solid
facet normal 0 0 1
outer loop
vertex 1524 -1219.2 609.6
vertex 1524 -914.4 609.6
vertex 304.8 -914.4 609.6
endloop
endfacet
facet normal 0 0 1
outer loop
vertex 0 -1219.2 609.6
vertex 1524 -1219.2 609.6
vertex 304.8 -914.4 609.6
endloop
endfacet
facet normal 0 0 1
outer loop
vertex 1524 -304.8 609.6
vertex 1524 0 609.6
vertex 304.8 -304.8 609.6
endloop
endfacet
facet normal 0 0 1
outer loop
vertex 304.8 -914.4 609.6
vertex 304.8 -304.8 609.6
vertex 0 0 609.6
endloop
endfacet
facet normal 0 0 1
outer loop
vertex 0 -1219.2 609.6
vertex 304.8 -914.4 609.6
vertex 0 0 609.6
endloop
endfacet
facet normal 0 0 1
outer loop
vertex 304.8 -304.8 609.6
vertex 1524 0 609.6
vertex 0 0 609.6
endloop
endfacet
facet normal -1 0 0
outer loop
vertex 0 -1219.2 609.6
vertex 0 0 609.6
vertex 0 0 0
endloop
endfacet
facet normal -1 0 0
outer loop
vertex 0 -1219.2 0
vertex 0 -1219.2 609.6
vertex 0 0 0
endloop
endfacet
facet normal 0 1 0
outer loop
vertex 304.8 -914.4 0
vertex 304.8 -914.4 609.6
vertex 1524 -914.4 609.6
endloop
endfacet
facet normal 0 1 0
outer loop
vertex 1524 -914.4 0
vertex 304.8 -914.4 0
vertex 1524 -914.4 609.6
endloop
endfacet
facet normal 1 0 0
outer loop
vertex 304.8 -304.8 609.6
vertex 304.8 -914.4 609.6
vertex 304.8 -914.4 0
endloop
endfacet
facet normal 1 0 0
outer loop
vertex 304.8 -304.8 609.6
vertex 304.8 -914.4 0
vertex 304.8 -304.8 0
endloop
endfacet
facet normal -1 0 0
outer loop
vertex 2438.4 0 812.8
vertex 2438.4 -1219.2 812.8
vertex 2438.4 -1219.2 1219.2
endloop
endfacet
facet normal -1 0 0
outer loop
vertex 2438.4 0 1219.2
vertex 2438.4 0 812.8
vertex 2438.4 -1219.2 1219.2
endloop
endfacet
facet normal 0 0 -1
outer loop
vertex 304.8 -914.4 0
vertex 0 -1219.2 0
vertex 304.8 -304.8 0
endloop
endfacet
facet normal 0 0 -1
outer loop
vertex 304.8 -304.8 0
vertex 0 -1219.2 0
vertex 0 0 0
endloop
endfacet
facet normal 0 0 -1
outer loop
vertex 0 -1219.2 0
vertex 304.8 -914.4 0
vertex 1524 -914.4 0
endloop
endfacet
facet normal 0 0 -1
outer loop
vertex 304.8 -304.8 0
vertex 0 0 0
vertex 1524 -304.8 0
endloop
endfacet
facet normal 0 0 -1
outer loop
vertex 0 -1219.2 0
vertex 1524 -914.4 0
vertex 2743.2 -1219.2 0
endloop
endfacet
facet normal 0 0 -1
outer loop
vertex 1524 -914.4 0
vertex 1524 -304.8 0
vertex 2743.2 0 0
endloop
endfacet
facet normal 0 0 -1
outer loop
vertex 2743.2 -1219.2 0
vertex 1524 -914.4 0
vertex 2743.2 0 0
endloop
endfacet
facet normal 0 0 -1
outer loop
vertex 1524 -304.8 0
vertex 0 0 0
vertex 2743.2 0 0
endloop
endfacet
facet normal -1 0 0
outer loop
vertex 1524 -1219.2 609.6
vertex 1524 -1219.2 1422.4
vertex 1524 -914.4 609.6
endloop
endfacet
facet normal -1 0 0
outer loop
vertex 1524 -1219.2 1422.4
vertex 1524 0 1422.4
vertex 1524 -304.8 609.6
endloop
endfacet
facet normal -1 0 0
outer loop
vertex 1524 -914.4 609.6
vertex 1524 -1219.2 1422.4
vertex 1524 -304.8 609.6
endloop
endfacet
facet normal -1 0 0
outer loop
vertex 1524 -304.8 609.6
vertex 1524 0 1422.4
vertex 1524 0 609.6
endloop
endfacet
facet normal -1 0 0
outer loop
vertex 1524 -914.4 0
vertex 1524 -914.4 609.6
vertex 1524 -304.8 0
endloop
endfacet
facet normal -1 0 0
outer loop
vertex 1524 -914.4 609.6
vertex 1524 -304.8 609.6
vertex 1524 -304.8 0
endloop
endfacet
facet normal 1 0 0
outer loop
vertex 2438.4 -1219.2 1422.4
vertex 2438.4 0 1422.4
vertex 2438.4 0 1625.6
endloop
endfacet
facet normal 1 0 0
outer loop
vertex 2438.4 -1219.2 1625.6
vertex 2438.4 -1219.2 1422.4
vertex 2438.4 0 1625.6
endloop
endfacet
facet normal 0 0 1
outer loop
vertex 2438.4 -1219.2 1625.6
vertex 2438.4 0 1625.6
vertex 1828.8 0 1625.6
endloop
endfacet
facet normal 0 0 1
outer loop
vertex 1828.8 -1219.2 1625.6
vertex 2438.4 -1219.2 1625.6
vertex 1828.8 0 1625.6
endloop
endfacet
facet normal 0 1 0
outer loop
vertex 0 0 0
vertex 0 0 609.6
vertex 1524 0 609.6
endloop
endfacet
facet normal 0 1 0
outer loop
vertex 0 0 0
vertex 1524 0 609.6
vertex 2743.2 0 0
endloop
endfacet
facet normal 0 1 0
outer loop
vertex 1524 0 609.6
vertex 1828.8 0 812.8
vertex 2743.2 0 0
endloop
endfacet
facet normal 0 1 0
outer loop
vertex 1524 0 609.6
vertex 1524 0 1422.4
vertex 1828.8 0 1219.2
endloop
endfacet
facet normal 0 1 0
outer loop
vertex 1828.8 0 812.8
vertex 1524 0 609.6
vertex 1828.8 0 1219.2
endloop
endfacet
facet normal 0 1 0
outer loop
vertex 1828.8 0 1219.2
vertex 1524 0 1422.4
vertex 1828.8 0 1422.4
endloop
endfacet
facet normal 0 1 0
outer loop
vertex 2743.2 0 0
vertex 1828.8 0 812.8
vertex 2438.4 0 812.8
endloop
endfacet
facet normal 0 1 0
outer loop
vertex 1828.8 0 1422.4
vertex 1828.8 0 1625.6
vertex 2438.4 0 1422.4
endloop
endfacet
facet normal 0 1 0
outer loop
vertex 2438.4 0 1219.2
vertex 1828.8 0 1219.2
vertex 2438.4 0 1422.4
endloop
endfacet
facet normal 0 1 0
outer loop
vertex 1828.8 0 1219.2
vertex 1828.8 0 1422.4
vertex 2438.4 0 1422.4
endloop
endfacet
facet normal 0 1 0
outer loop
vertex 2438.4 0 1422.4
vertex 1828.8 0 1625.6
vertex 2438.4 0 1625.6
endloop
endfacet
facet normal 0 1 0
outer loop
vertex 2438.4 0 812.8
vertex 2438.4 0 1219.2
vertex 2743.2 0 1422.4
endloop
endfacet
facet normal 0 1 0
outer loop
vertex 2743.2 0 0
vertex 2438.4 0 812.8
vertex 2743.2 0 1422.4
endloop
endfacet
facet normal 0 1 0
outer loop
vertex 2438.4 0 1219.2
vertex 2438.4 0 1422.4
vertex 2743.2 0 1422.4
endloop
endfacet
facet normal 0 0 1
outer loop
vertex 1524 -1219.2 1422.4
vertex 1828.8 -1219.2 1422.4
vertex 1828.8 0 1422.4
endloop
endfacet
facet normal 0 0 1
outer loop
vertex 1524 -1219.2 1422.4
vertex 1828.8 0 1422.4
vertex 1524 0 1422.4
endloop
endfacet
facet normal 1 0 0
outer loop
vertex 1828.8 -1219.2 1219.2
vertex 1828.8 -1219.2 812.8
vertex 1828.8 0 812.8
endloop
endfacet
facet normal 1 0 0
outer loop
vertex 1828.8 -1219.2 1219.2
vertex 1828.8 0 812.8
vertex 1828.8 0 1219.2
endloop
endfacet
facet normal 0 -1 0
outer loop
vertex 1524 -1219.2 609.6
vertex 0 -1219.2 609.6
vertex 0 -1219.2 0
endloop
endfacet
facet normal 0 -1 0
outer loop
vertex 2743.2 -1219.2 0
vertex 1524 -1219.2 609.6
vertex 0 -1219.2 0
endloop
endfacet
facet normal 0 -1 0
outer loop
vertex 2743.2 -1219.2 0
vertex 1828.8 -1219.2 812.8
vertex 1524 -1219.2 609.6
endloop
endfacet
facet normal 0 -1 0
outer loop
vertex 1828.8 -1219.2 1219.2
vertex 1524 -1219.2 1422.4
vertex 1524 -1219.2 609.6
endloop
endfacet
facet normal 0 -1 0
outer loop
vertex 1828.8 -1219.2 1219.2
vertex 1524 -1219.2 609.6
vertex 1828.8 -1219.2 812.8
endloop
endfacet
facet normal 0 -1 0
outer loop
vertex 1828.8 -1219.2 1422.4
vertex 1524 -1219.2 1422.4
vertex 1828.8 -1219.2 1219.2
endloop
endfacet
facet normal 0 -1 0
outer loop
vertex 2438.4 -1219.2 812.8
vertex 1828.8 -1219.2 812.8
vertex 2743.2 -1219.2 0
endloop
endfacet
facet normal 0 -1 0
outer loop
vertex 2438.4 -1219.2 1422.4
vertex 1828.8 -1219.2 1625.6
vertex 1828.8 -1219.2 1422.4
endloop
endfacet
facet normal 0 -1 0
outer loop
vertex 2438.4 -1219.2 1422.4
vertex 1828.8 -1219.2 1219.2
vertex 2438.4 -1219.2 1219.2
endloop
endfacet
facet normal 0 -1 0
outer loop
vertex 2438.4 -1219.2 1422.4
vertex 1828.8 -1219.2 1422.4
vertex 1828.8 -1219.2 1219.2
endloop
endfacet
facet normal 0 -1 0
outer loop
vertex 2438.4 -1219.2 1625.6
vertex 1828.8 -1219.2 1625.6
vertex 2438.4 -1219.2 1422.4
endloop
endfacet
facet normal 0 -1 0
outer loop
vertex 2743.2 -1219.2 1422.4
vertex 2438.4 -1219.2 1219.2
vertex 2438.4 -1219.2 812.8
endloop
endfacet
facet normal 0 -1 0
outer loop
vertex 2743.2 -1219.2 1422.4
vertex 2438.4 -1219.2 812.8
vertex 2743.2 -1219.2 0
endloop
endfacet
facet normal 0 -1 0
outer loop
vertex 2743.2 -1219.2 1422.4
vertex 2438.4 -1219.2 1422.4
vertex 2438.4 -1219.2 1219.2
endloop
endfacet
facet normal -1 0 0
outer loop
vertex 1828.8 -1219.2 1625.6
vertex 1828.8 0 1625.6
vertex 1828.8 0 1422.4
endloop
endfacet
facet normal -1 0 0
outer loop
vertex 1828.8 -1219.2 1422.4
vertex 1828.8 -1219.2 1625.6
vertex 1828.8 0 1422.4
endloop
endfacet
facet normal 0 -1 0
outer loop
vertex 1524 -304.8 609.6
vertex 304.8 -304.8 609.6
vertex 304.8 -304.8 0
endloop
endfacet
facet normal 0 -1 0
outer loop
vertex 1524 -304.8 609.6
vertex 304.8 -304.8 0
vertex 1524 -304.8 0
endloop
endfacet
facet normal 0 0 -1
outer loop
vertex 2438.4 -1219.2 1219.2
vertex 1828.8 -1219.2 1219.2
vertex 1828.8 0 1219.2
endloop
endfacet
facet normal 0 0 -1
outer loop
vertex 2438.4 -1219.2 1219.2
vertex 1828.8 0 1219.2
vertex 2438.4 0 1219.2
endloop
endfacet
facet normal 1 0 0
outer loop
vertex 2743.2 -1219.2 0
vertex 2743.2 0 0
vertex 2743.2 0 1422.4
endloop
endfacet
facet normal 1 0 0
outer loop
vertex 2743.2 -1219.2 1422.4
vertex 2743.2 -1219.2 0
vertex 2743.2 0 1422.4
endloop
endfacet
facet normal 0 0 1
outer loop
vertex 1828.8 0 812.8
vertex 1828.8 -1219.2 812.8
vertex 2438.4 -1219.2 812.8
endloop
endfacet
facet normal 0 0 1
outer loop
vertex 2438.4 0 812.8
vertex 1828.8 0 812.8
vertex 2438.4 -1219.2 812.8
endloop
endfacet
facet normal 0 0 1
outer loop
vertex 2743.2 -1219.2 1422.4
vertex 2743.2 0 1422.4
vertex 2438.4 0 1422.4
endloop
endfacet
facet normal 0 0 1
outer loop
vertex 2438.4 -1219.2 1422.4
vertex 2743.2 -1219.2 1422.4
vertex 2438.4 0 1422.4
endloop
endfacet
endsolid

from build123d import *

# Parameters (mm, degrees)
F1_DEPTH = 1219.2
F2_W     = 609.6
F2_H     = 406.4
F3_DEPTH = 1219.2
F4_W     = 1219.2
F4_H     = 609.6
F5_DEPTH = 609.6


# Not quite as in the source:
# - a feature of the source that left no trace in its solid (it failed there, or was rolled back) is left out


with BuildPart() as f1:
    # F0 (on Front) → F1 (new body)
    with BuildSketch(Plane.XZ):
        Polygon((0, 609.6), (0, 0), (2743.2, 0), (2743.2, 1422.4), (2438.4, 1422.4), (2438.4, 1625.6), (1828.8, 1625.6), (1828.8, 1422.4), (1524, 1422.4), (1524, 609.6), align=None)
    extrude(amount=F1_DEPTH)

    # F2 (on face) → F3 (cut)
    with BuildSketch(Plane.XZ.offset(1219.2)):
        with Locations((2133.6, 1016)):
            Rectangle(F2_W, F2_H)
    extrude(amount=-F3_DEPTH, mode=Mode.SUBTRACT)

    # F4 (on face) → F5 (cut)
    with BuildSketch(Plane.XY.offset(609.6)):
        with Locations((914.4, -609.6)):
            Rectangle(F4_W, F4_H)
    extrude(amount=-F5_DEPTH, mode=Mode.SUBTRACT)


solid = f1.part
